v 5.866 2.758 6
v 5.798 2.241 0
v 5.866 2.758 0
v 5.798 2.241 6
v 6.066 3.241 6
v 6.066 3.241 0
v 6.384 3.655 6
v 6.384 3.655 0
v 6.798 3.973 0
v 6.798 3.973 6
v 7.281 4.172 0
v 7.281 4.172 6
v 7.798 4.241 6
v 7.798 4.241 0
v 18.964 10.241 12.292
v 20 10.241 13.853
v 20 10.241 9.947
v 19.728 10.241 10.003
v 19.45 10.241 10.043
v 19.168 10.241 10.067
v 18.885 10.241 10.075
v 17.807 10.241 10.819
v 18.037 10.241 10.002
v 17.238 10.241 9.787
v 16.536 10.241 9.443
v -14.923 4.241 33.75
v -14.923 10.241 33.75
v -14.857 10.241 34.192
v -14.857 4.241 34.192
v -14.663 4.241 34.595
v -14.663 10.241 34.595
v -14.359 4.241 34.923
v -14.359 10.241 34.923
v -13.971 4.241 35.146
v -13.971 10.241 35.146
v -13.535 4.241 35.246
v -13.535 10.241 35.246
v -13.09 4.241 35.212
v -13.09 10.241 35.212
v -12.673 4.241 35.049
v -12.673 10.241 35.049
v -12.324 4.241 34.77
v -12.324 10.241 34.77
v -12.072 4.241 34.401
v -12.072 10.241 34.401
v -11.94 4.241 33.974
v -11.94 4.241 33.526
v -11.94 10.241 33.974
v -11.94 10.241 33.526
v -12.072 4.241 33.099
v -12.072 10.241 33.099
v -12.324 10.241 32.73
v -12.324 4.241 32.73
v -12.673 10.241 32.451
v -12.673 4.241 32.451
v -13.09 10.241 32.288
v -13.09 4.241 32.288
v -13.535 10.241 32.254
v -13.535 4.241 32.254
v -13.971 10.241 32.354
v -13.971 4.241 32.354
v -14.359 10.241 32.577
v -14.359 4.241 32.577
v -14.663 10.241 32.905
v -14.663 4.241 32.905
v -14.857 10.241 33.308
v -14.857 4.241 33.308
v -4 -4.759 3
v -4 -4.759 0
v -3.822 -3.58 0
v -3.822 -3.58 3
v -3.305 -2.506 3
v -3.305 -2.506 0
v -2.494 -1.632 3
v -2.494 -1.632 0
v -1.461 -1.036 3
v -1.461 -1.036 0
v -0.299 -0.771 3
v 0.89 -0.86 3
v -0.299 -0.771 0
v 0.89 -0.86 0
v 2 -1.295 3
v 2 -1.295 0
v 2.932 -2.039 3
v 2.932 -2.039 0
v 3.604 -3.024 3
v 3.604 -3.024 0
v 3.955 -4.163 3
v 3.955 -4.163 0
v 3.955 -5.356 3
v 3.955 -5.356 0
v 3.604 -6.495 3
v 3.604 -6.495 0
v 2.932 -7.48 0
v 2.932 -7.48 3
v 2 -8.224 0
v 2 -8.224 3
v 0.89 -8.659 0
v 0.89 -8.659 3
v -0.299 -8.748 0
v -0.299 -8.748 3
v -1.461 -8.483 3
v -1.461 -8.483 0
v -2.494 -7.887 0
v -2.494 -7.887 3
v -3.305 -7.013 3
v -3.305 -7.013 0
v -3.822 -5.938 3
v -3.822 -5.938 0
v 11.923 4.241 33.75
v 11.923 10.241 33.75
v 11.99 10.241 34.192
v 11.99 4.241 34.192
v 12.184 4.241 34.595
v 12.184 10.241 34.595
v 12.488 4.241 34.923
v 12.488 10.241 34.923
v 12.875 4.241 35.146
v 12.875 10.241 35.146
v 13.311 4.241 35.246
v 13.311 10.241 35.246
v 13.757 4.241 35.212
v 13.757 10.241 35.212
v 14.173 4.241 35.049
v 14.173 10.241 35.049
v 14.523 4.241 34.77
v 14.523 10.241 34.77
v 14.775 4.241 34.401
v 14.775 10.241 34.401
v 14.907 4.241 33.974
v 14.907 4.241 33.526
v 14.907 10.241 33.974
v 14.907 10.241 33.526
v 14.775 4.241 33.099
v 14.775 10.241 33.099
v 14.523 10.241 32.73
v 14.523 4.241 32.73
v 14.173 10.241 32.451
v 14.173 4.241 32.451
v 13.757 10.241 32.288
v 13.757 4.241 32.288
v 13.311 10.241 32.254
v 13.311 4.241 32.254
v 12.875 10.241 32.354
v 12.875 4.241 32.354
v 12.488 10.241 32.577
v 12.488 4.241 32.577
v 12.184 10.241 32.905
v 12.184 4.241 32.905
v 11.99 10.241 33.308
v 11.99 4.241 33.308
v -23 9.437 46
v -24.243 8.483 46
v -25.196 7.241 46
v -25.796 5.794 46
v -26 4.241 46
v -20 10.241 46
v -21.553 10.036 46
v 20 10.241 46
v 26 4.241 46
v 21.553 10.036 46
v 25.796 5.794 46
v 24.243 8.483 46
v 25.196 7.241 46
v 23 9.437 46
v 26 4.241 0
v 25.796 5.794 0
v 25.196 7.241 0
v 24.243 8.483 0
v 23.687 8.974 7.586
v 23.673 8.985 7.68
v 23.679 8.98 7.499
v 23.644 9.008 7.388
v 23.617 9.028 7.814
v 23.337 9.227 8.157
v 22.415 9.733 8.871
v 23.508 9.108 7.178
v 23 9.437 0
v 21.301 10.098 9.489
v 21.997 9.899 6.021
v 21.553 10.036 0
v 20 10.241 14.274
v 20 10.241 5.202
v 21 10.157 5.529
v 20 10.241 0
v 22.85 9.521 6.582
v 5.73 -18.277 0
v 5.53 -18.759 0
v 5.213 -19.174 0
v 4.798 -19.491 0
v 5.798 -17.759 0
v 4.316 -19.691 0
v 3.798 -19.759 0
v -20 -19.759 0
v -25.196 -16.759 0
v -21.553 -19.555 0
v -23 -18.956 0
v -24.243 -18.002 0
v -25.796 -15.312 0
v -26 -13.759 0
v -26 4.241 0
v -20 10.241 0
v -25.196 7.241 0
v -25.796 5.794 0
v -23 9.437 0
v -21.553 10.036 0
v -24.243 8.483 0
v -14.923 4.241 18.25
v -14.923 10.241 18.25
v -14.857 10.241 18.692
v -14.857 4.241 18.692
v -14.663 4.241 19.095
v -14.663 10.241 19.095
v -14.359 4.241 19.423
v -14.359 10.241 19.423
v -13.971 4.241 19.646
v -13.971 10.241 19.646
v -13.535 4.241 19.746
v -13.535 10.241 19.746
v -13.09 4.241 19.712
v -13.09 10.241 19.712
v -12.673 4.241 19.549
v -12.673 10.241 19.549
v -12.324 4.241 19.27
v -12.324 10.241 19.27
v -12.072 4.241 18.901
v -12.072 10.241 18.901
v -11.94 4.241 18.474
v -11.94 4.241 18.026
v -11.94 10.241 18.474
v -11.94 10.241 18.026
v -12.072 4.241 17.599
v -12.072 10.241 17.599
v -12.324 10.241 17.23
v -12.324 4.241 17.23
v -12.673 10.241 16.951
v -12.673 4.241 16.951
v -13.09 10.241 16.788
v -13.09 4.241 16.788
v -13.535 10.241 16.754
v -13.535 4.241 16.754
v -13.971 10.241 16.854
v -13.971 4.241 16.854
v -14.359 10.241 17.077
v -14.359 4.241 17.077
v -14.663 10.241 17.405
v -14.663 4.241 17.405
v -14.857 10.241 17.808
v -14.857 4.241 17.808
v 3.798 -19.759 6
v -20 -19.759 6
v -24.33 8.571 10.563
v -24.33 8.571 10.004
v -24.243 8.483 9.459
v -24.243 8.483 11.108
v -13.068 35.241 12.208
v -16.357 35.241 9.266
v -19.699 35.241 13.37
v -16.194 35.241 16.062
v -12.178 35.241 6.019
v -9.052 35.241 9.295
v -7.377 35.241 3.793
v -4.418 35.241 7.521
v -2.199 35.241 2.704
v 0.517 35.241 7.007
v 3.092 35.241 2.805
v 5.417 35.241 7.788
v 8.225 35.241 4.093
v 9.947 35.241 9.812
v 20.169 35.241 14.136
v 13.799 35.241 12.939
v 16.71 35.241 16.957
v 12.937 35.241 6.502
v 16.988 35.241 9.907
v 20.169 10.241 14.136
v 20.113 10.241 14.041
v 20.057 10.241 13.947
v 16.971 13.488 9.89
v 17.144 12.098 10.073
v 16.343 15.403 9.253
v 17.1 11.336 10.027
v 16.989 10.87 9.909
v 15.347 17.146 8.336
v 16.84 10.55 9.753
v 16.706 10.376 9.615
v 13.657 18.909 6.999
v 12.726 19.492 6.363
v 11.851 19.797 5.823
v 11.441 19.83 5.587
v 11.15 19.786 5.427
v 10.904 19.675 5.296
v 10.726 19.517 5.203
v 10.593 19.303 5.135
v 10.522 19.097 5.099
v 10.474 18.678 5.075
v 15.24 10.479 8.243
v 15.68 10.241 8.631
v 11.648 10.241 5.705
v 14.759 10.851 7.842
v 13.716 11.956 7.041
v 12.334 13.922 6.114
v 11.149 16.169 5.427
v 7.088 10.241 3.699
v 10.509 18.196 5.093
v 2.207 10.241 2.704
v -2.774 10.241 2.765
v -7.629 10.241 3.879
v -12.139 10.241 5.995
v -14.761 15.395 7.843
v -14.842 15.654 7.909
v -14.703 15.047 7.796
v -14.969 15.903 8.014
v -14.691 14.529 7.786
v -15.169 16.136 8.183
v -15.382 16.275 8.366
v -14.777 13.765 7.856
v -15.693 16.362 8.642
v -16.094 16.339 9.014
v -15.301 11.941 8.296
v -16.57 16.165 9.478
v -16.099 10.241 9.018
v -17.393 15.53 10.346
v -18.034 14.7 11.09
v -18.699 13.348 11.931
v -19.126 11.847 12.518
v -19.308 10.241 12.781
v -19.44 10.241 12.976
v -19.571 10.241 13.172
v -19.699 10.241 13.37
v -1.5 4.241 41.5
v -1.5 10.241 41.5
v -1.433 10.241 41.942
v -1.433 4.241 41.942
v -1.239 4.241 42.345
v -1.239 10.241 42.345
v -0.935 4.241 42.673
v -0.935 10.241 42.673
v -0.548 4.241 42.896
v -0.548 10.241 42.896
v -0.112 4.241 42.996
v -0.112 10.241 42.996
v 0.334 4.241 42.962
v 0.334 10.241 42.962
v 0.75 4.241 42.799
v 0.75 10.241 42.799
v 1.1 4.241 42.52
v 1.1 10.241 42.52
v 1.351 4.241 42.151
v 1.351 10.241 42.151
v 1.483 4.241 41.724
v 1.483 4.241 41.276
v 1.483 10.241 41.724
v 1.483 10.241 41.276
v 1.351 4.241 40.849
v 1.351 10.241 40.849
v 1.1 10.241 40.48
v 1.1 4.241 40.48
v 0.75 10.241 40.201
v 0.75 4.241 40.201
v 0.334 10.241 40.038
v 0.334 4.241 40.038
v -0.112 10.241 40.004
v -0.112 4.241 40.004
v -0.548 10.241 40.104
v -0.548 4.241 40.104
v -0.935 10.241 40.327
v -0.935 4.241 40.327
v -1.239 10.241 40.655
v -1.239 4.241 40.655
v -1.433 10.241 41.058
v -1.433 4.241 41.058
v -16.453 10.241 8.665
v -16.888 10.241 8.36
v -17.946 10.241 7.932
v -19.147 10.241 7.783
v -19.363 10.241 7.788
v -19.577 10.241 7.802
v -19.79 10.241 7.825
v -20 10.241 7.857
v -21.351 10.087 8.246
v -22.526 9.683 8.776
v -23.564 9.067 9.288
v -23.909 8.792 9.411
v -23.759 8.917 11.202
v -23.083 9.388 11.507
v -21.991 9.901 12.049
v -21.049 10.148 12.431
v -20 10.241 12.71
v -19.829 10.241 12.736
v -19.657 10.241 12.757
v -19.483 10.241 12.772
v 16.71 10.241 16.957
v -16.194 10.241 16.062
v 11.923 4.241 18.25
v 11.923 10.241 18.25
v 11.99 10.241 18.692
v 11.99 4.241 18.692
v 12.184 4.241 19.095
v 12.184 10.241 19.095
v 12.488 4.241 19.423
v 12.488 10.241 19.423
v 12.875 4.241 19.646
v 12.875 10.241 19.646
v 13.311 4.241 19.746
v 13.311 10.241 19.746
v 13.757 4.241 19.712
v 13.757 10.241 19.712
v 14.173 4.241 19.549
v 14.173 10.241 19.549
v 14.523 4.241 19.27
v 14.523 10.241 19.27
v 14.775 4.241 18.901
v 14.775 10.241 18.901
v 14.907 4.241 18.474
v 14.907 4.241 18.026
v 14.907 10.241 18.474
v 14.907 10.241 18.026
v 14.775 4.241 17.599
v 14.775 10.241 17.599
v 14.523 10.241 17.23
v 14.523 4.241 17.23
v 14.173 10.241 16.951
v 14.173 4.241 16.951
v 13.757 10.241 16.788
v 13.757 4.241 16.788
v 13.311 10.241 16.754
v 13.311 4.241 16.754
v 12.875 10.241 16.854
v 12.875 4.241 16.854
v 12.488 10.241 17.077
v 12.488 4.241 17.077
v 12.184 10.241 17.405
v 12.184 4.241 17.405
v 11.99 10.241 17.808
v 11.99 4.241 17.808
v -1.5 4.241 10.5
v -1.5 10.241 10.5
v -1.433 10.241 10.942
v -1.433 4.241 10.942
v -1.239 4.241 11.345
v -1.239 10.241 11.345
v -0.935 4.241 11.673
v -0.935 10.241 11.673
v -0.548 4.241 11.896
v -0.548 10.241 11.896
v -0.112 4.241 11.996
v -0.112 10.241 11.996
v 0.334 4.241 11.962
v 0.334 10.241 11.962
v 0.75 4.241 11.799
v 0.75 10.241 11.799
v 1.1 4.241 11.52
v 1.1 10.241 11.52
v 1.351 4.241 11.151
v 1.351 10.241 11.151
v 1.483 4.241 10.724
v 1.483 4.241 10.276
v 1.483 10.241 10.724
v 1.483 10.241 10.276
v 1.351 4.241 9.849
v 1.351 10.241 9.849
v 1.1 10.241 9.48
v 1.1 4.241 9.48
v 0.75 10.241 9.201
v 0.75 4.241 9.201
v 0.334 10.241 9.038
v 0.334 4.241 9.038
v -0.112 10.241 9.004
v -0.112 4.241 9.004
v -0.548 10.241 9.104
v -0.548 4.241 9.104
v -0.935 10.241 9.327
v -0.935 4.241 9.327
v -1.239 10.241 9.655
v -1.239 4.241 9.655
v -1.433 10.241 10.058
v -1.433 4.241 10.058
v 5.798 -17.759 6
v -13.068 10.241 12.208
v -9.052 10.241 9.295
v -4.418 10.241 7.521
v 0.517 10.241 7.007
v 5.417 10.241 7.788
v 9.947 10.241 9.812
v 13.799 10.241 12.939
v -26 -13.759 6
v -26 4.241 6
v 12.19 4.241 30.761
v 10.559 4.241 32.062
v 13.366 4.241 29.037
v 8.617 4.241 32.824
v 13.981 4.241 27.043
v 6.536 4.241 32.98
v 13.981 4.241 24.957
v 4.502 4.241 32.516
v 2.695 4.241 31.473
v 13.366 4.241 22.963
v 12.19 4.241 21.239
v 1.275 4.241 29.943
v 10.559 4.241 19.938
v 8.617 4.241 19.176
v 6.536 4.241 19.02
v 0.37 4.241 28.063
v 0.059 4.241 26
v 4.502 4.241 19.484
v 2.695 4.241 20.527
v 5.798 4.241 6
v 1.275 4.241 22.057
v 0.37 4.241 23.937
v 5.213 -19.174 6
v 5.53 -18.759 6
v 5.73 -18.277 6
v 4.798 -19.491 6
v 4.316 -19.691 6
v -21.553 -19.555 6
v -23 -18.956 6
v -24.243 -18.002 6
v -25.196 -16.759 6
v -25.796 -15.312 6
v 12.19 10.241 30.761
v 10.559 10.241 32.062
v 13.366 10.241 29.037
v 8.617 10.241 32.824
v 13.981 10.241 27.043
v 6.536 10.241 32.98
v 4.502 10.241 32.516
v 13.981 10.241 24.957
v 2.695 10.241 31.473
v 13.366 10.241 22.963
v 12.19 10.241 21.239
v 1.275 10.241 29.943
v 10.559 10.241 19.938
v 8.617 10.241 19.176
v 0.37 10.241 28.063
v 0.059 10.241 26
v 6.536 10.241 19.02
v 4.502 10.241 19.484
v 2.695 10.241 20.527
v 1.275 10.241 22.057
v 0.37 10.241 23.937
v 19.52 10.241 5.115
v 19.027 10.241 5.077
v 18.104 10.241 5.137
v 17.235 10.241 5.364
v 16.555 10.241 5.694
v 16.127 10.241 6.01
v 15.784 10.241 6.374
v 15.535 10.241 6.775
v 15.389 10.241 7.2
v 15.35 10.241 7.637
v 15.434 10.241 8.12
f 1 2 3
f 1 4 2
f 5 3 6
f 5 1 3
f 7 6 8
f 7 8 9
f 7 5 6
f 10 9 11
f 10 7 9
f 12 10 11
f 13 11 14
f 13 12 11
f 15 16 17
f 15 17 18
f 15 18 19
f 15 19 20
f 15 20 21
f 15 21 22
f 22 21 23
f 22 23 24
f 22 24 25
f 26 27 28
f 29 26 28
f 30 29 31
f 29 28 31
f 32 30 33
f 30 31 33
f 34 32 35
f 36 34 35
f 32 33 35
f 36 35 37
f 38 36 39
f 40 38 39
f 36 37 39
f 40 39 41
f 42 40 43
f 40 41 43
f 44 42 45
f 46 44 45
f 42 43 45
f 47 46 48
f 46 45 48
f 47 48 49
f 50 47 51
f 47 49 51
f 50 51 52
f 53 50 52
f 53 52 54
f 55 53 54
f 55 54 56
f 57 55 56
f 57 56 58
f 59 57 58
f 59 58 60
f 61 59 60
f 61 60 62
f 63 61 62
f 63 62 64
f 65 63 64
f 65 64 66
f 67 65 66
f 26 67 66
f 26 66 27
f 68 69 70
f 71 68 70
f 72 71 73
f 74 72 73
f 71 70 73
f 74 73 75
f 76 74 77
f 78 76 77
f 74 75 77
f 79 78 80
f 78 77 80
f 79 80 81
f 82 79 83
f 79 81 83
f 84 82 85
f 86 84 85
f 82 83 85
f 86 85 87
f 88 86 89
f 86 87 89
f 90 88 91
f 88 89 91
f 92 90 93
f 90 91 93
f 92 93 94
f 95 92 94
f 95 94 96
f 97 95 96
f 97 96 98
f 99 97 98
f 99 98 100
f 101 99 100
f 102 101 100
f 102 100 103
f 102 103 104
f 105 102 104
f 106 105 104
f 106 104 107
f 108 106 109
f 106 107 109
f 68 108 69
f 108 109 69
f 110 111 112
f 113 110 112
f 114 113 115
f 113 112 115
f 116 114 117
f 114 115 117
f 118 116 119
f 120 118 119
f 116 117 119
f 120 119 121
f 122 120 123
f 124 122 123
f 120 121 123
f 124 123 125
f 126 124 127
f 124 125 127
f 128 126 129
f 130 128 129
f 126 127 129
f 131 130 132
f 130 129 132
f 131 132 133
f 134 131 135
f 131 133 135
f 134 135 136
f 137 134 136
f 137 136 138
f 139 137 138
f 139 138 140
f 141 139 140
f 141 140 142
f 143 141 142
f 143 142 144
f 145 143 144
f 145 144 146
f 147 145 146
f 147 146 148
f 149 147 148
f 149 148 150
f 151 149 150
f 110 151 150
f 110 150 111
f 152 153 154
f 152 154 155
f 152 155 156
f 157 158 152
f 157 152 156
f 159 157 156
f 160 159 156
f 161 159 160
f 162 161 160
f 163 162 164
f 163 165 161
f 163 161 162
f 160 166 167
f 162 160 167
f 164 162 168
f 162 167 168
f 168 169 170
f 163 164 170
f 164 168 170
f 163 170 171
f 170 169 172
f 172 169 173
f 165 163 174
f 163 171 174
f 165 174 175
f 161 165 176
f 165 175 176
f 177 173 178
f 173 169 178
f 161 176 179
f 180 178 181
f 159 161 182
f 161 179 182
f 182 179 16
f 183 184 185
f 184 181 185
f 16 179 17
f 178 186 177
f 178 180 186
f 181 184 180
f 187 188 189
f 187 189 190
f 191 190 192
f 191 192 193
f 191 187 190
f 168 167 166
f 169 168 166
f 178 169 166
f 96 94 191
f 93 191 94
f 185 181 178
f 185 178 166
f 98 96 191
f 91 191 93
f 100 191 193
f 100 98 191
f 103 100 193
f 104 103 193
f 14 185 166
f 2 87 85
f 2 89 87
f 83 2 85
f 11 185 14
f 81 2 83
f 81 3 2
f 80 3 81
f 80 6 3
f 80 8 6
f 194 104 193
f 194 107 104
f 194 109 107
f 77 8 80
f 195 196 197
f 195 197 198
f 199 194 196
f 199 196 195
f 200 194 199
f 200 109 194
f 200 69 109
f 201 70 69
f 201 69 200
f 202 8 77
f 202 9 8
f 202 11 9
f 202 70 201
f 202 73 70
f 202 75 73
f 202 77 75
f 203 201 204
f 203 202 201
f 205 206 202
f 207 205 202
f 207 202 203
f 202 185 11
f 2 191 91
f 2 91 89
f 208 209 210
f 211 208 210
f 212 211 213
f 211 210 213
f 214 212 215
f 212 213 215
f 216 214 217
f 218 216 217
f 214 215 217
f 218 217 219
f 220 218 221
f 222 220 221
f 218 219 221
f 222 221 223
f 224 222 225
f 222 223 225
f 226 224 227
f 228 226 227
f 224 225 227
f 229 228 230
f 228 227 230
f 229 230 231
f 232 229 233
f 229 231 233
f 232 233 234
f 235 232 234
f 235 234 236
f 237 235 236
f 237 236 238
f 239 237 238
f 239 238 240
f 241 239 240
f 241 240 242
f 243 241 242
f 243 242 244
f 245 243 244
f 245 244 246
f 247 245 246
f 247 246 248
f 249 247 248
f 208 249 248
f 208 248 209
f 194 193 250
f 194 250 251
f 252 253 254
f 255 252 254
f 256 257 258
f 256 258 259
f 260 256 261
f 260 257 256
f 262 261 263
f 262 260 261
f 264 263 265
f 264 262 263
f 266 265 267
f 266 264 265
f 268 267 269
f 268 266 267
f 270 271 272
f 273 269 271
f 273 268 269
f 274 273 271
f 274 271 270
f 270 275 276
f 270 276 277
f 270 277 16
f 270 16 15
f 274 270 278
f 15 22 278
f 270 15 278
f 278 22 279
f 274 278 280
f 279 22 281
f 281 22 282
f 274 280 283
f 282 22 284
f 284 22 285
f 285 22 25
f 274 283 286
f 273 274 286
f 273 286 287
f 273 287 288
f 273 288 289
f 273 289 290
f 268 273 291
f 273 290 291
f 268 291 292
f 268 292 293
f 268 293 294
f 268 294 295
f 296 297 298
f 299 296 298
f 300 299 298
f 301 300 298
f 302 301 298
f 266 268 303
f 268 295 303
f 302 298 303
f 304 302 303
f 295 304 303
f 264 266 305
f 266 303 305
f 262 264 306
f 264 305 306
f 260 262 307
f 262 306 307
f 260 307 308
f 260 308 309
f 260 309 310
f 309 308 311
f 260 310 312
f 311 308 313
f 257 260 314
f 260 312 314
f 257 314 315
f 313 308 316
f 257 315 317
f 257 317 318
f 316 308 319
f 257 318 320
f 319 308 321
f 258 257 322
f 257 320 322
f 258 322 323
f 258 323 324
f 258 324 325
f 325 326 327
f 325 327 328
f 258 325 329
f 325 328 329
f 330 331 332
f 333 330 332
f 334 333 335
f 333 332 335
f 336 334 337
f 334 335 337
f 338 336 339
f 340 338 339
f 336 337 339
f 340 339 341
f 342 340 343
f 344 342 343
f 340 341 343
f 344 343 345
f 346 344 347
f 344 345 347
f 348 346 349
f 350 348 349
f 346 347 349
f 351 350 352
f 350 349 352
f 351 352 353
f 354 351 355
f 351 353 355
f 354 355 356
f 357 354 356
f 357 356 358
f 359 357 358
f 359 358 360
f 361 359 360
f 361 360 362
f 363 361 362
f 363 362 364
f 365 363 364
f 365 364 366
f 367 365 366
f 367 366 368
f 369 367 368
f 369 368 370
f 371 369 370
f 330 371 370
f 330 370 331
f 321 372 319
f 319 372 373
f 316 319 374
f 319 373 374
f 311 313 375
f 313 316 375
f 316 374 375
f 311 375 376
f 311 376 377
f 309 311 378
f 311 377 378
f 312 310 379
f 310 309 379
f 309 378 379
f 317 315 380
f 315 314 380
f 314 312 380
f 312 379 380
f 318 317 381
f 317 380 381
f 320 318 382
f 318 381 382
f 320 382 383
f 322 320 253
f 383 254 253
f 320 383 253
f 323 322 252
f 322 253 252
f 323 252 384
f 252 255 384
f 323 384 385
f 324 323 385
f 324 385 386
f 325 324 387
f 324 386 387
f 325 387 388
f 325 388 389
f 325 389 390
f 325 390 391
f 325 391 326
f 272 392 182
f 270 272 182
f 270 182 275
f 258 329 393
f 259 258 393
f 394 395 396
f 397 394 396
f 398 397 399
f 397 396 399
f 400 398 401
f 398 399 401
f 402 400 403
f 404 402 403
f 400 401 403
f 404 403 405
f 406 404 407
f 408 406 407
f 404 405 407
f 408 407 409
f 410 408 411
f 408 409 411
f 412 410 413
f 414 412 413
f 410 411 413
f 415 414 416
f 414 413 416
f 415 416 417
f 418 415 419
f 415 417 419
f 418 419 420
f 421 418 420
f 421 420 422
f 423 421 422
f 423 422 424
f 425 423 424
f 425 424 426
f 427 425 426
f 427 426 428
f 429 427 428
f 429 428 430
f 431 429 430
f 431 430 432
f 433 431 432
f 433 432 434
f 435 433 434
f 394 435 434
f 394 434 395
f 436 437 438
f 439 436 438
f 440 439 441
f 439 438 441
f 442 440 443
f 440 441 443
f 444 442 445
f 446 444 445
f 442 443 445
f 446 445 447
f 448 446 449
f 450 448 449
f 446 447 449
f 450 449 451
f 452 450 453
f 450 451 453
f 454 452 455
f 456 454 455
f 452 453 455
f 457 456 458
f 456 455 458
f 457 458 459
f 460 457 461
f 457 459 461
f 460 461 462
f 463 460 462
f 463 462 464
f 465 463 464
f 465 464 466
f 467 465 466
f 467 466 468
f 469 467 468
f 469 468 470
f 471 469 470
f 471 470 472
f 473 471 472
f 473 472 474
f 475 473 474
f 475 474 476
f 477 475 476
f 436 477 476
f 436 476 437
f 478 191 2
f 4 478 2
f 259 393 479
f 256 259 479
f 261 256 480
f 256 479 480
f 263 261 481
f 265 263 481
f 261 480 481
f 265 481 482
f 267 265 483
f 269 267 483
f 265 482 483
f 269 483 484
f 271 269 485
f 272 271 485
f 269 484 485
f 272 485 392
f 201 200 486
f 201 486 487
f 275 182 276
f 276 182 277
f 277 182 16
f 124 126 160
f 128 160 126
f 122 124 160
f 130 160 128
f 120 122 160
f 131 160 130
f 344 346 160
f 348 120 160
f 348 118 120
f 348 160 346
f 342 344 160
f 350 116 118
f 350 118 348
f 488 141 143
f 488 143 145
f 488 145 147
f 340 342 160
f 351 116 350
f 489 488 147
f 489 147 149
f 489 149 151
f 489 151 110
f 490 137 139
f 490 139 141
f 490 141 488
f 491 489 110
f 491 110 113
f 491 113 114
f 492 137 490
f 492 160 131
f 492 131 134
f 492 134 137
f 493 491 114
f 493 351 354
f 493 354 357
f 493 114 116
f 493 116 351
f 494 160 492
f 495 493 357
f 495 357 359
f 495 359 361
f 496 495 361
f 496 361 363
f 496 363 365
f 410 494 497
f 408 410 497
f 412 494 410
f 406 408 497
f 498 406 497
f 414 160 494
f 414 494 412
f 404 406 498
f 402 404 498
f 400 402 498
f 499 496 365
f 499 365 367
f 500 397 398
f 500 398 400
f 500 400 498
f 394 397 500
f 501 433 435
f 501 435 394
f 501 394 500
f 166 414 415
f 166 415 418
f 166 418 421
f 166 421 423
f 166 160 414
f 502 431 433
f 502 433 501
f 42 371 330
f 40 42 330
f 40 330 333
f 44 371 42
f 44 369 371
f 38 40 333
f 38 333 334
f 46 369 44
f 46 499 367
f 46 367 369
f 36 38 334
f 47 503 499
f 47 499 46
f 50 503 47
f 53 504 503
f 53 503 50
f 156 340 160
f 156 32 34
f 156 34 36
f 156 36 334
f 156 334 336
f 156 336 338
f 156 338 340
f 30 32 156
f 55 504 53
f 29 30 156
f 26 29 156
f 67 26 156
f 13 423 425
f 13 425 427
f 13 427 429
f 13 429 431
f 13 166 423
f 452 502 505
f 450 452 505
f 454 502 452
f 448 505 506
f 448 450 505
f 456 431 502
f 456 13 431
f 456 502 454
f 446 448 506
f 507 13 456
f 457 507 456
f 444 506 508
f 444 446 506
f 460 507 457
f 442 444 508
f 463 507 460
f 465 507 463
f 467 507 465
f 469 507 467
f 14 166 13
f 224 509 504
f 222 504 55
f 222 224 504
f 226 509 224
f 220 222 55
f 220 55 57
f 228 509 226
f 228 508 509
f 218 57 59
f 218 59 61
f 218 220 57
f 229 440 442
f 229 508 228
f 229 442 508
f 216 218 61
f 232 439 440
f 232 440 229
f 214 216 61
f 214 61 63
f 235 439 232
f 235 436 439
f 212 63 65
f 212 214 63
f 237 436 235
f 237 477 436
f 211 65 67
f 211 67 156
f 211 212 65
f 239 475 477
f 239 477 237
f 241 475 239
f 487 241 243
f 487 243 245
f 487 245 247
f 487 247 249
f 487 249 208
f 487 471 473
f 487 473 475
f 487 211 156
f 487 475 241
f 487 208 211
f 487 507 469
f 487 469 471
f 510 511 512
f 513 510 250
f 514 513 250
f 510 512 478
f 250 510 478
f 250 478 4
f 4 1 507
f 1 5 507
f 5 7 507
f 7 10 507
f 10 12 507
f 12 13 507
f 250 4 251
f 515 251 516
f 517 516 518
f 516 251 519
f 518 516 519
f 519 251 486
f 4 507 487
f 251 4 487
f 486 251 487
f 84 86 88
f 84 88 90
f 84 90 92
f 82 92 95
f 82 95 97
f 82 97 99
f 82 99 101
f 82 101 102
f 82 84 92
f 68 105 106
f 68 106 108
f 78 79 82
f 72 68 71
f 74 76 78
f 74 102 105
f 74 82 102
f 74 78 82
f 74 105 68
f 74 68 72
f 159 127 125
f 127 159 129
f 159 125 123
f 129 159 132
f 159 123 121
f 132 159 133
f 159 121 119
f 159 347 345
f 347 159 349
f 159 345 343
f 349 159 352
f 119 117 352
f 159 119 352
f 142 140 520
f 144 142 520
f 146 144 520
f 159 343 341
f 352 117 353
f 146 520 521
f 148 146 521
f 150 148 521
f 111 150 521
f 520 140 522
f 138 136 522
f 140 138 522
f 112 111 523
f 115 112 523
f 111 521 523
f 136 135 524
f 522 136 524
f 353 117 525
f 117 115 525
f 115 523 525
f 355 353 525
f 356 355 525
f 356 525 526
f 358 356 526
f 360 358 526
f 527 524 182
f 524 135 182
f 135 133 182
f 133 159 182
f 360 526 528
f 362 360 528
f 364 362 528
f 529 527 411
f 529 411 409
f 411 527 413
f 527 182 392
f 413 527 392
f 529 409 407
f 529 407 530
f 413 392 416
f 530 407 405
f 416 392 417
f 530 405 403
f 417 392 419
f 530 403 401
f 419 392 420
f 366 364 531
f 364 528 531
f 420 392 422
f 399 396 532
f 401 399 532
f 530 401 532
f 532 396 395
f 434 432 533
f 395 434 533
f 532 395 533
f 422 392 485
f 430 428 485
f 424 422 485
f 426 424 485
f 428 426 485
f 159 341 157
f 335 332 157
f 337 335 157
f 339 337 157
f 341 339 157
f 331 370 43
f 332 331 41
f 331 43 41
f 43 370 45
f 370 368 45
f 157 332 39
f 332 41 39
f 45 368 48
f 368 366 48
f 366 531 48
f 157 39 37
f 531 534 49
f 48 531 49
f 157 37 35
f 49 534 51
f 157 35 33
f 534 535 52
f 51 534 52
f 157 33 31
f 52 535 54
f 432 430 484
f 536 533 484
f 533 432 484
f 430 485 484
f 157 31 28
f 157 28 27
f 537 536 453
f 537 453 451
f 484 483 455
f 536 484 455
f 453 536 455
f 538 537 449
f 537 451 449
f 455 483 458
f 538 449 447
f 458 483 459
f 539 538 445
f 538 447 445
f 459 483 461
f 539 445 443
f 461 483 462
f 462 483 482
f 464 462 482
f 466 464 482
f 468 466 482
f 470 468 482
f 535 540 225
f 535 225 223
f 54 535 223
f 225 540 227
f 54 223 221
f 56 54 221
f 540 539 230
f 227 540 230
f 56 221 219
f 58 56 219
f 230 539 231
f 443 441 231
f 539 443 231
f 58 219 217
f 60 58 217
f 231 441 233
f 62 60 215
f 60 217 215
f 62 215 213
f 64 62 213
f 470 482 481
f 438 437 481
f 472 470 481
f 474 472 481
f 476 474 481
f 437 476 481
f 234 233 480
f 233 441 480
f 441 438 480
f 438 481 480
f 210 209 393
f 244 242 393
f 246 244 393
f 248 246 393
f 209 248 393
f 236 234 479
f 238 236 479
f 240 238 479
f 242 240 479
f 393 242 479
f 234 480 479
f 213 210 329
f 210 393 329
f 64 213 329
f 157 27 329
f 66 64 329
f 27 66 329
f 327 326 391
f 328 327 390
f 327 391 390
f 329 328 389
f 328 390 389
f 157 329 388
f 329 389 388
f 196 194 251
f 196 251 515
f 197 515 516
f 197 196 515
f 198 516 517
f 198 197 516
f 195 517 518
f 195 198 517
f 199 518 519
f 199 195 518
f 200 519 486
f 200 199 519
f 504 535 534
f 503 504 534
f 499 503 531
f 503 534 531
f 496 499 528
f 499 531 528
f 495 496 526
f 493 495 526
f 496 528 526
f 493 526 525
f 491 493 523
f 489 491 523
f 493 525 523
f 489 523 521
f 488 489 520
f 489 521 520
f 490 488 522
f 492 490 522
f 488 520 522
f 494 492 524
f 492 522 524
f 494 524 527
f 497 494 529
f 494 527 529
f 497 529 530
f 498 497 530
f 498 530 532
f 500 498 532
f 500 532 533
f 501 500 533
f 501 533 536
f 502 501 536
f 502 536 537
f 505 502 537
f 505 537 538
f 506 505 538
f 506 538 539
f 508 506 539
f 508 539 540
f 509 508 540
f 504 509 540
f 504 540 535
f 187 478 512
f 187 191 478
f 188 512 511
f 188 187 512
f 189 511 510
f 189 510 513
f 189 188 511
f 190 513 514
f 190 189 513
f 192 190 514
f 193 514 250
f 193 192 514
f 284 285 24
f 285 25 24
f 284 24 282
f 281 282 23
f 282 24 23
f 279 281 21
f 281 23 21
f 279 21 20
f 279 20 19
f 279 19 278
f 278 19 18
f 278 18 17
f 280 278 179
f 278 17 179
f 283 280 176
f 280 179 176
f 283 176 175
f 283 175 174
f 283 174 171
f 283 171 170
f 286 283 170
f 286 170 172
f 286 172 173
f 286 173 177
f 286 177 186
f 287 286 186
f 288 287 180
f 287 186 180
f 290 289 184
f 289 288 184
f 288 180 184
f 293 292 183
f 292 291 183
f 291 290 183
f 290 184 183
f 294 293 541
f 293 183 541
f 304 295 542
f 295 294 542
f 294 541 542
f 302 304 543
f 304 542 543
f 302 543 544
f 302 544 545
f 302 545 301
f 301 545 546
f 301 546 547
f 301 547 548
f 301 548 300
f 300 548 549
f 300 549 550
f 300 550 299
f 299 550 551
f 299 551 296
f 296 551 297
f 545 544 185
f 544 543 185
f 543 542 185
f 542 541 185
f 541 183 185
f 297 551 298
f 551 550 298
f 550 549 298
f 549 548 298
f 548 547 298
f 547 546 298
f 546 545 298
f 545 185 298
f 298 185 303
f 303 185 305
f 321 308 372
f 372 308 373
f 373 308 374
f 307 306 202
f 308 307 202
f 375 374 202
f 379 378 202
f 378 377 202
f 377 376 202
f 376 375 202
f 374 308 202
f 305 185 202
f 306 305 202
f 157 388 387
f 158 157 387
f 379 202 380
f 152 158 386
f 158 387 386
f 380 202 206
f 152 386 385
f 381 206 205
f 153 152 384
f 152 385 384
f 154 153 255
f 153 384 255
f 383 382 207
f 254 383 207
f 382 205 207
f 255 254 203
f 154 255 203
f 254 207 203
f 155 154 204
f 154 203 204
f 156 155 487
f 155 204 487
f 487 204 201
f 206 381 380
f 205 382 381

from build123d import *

# Parameters (mm, degrees)
BOSS_EXTRUDE1_DEPTH      = 6
BOSS_EXTRUDE2_DEPTH      = 40
CUT_EXTRUDE1_REACH       = 62.762
SKETCH9_R                = 1.5
CUT_EXTRUDE2_REACH       = 62.762
SKETCH10_R               = 7
BOSS_EXTRUDE4_DEPTH      = 25
BOSS_EXTRUDE5_REACH      = 73.576
BOSS_EXTRUDE5_END_RADIUS = 23.4
SKETCH12_R               = 2.5
BOSS_EXTRUDE6_REACH      = 73.576
SKETCH14_R               = 2.5
SKETCH15_W               = 42.894850158
SKETCH15_H               = 27.148059605
CUT_EXTRUDE3_DEPTH       = 6
FILLET1_R                = 2
SKETCH7_R                = 4
CUT_EXTRUDE4_DEPTH       = 3


with BuildPart() as part:
    # Sketch3 → Boss-Extrude1 (new body)
    with BuildSketch(Plane.XY):
        with BuildLine():
            Line((-20, 10.240601504), (20, 10.240601504))
            ThreePointArc((20, 10.240601504), (24.242640687, 8.483242191), (26, 4.240601504))
            Line((26, 4.240601504), (26, -13.759398496))
            ThreePointArc((26, -13.759398496), (24.242640687, -18.002039183), (20, -19.759398496))
            Line((20, -19.759398496), (-20, -19.759398496))
            ThreePointArc((-20, -19.759398496), (-24.242640687, -18.002039183), (-26, -13.759398496))
            Line((-26, -13.759398496), (-26, 4.240601504))
            ThreePointArc((-26, 4.240601504), (-24.242640687, 8.483242191), (-20, 10.240601504))
        make_face()
    extrude(amount=BOSS_EXTRUDE1_DEPTH)

    # Sketch4 → Boss-Extrude2 (add)
    with BuildSketch(Plane.XY.offset(6)):
        with BuildLine():
            Line((-26, 4.240601504), (26, 4.240601504))
            ThreePointArc((26, 4.240601504), (24.242640687, 8.483242191), (20, 10.240601504))
            Line((20, 10.240601504), (-20, 10.240601504))
            ThreePointArc((-20, 10.240601504), (-24.242640687, 8.483242191), (-26, 4.240601504))
        make_face()
    extrude(amount=BOSS_EXTRUDE2_DEPTH)

    # Sketch9 → Cut-Extrude1 (cut, up to next)
    with BuildSketch(Plane(origin=(0, 10.240601504, 0), x_dir=(1, 0, 0), z_dir=(0, 1, 0)), mode=Mode.PRIVATE) as cut_extrude1_sk1:
        with Locations(Location((0, -41.5, 0), (0, 0, 180))):
            Circle(SKETCH9_R)
    cut_extrude1_tool1 = extrude(cut_extrude1_sk1.sketch, amount=-CUT_EXTRUDE1_REACH, mode=Mode.PRIVATE) & part.part
    # Sketch9 → Cut-Extrude1 (cut, up to next)
    with BuildSketch(Plane(origin=(0, 10.240601504, 0), x_dir=(1, 0, 0), z_dir=(0, 1, 0)), mode=Mode.PRIVATE) as cut_extrude1_sk2:
        with Locations(Location((13.423393759, -33.75, 0), (0, 0, 180))):
            Circle(SKETCH9_R)
    cut_extrude1_tool2 = extrude(cut_extrude1_sk2.sketch, amount=-CUT_EXTRUDE1_REACH, mode=Mode.PRIVATE) & part.part
    # Sketch9 → Cut-Extrude1 (cut, up to next)
    with BuildSketch(Plane(origin=(0, 10.240601504, 0), x_dir=(1, 0, 0), z_dir=(0, 1, 0)), mode=Mode.PRIVATE) as cut_extrude1_sk3:
        with Locations(Location((-13.423393759, -33.75, 0), (0, 0, 180))):
            Circle(SKETCH9_R)
    cut_extrude1_tool3 = extrude(cut_extrude1_sk3.sketch, amount=-CUT_EXTRUDE1_REACH, mode=Mode.PRIVATE) & part.part
    # Sketch9 → Cut-Extrude1 (cut, up to next)
    with BuildSketch(Plane(origin=(0, 10.240601504, 0), x_dir=(1, 0, 0), z_dir=(0, 1, 0)), mode=Mode.PRIVATE) as cut_extrude1_sk4:
        with Locations(Location((-13.423393759, -18.25, 0), (0, 0, 180))):
            Circle(SKETCH9_R)
    cut_extrude1_tool4 = extrude(cut_extrude1_sk4.sketch, amount=-CUT_EXTRUDE1_REACH, mode=Mode.PRIVATE) & part.part
    # Sketch9 → Cut-Extrude1 (cut, up to next)
    with BuildSketch(Plane(origin=(0, 10.240601504, 0), x_dir=(1, 0, 0), z_dir=(0, 1, 0)), mode=Mode.PRIVATE) as cut_extrude1_sk5:
        with Locations(Location((0, -10.5, 0), (0, 0, 180))):
            Circle(SKETCH9_R)
    cut_extrude1_tool5 = extrude(cut_extrude1_sk5.sketch, amount=-CUT_EXTRUDE1_REACH, mode=Mode.PRIVATE) & part.part
    # Sketch9 → Cut-Extrude1 (cut, up to next)
    with BuildSketch(Plane(origin=(0, 10.240601504, 0), x_dir=(1, 0, 0), z_dir=(0, 1, 0)), mode=Mode.PRIVATE) as cut_extrude1_sk6:
        with Locations(Location((13.423393759, -18.25, 0), (0, 0, 180))):
            Circle(SKETCH9_R)
    cut_extrude1_tool6 = extrude(cut_extrude1_sk6.sketch, amount=-CUT_EXTRUDE1_REACH, mode=Mode.PRIVATE) & part.part
    add(cut_extrude1_tool1.solids().sort_by_distance((0, 10.240602, 41.5))[0], mode=Mode.SUBTRACT)
    add(cut_extrude1_tool2.solids().sort_by_distance((13.423394, 10.240602, 33.75))[0], mode=Mode.SUBTRACT)
    add(cut_extrude1_tool3.solids().sort_by_distance((-13.423394, 10.240602, 33.75))[0], mode=Mode.SUBTRACT)
    add(cut_extrude1_tool4.solids().sort_by_distance((-13.423394, 10.240602, 18.25))[0], mode=Mode.SUBTRACT)
    add(cut_extrude1_tool5.solids().sort_by_distance((0, 10.240602, 10.5))[0], mode=Mode.SUBTRACT)
    add(cut_extrude1_tool6.solids().sort_by_distance((13.423394, 10.240602, 18.25))[0], mode=Mode.SUBTRACT)

    # Sketch10 → Cut-Extrude2 (cut, up to next)
    with BuildSketch(Plane(origin=(0, 10.240601504, 0), x_dir=(1, 0, 0), z_dir=(0, 1, 0)), mode=Mode.PRIVATE) as cut_extrude2_sk1:
        with Locations(Location((7.059090501, -26, 0), (0, 0, 180))):
            Circle(SKETCH10_R)
    cut_extrude2_tool1 = extrude(cut_extrude2_sk1.sketch, amount=-CUT_EXTRUDE2_REACH, mode=Mode.PRIVATE) & part.part
    add(cut_extrude2_tool1.solids().sort_by_distance((7.059091, 10.240602, 26))[0], mode=Mode.SUBTRACT)

    # Sketch11 → Boss-Extrude4 (add)
    with BuildSketch(Plane(origin=(0, 10.240601504, 0), x_dir=(1, 0, 0), z_dir=(0, 1, 0))):
        with BuildLine():
            Line((16.710143733, -16.95726278), (20.169460133, -14.136068192))
            ThreePointArc((20.169460133, -14.136068192), (0.449710611, -2.604321759), (-19.698633669, -13.369725595))
            Line((-19.698633669, -13.369725595), (-16.193668166, -16.061936238))
            ThreePointArc((-16.193668166, -16.061936238), (0.516806692, -7.007029963), (16.710143733, -16.95726278))
        make_face()
    extrude(amount=BOSS_EXTRUDE4_DEPTH)

    # Boss-Extrude5: up to this cylinder (the profile starts outside it)
    boss_extrude5_end = Plane(origin=(0, 6.683051, 26), z_dir=(0, -1, 0)) * Cylinder(BOSS_EXTRUDE5_END_RADIUS, 194.952, mode=Mode.PRIVATE)
    # Sketch12 → Boss-Extrude5 (add, up to the surface)
    with BuildSketch(Plane(origin=(7.879699248, -7.879699248, 0), x_dir=(0, 0, 1), z_dir=(-0.7071067811865489, 0.7071067811865462, 0)), mode=Mode.PRIVATE) as boss_extrude5_sk1:
        with Locations((7.574761701, 20.594839086)):
            Circle(SKETCH12_R)
    boss_extrude5_tool1 = extrude(boss_extrude5_sk1.sketch, amount=BOSS_EXTRUDE5_REACH, mode=Mode.PRIVATE) - boss_extrude5_end
    add(boss_extrude5_tool1.solids().sort_by_distance((22.44245, 6.683051, 7.574762))[0])

    # Sketch14 → Boss-Extrude6 (add, up to next)
    with BuildSketch(Plane(origin=(-7.879699248, -7.879699248, 0), x_dir=(0, 0, -1), z_dir=(0.7071067811865487, 0.7071067811865465, 0)), mode=Mode.PRIVATE) as boss_extrude6_sk1:
        with Locations((-10.283332747, 20.780524406)):
            Circle(SKETCH14_R)
    boss_extrude6_tool1 = extrude(boss_extrude6_sk1.sketch, amount=BOSS_EXTRUDE6_REACH, mode=Mode.PRIVATE) - part.part
    add(boss_extrude6_tool1.solids().sort_by_distance((-22.573749, 6.81435, 10.283333))[0])

    # Sketch15 → Cut-Extrude3 (cut)
    with BuildSketch(Plane(origin=(0, 0, 0), x_dir=(-1, 0, 0), z_dir=(0, 0, -1))):
        with Locations((-27.245771634, -9.333428299)):
            Rectangle(SKETCH15_W, SKETCH15_H)
    extrude(amount=-CUT_EXTRUDE3_DEPTH, mode=Mode.SUBTRACT)

    # Fillet1
    fillet1_edges = [part.edges().sort_by_distance(p)[0] for p in [
        (5.798346555, -19.759398496, 3),
        (5.798346555, 4.240601504, 3),
    ]]
    fillet(fillet1_edges, radius=FILLET1_R)

    # Sketch7 → Cut-Extrude4 (cut)
    with BuildSketch(Plane(origin=(0, 0, 0), x_dir=(-1, 0, 0), z_dir=(0, 0, -1))):
        with Locations((0, -4.759398496)):
            Circle(SKETCH7_R)
    extrude(amount=-CUT_EXTRUDE4_DEPTH, mode=Mode.SUBTRACT)


solid = part.part
